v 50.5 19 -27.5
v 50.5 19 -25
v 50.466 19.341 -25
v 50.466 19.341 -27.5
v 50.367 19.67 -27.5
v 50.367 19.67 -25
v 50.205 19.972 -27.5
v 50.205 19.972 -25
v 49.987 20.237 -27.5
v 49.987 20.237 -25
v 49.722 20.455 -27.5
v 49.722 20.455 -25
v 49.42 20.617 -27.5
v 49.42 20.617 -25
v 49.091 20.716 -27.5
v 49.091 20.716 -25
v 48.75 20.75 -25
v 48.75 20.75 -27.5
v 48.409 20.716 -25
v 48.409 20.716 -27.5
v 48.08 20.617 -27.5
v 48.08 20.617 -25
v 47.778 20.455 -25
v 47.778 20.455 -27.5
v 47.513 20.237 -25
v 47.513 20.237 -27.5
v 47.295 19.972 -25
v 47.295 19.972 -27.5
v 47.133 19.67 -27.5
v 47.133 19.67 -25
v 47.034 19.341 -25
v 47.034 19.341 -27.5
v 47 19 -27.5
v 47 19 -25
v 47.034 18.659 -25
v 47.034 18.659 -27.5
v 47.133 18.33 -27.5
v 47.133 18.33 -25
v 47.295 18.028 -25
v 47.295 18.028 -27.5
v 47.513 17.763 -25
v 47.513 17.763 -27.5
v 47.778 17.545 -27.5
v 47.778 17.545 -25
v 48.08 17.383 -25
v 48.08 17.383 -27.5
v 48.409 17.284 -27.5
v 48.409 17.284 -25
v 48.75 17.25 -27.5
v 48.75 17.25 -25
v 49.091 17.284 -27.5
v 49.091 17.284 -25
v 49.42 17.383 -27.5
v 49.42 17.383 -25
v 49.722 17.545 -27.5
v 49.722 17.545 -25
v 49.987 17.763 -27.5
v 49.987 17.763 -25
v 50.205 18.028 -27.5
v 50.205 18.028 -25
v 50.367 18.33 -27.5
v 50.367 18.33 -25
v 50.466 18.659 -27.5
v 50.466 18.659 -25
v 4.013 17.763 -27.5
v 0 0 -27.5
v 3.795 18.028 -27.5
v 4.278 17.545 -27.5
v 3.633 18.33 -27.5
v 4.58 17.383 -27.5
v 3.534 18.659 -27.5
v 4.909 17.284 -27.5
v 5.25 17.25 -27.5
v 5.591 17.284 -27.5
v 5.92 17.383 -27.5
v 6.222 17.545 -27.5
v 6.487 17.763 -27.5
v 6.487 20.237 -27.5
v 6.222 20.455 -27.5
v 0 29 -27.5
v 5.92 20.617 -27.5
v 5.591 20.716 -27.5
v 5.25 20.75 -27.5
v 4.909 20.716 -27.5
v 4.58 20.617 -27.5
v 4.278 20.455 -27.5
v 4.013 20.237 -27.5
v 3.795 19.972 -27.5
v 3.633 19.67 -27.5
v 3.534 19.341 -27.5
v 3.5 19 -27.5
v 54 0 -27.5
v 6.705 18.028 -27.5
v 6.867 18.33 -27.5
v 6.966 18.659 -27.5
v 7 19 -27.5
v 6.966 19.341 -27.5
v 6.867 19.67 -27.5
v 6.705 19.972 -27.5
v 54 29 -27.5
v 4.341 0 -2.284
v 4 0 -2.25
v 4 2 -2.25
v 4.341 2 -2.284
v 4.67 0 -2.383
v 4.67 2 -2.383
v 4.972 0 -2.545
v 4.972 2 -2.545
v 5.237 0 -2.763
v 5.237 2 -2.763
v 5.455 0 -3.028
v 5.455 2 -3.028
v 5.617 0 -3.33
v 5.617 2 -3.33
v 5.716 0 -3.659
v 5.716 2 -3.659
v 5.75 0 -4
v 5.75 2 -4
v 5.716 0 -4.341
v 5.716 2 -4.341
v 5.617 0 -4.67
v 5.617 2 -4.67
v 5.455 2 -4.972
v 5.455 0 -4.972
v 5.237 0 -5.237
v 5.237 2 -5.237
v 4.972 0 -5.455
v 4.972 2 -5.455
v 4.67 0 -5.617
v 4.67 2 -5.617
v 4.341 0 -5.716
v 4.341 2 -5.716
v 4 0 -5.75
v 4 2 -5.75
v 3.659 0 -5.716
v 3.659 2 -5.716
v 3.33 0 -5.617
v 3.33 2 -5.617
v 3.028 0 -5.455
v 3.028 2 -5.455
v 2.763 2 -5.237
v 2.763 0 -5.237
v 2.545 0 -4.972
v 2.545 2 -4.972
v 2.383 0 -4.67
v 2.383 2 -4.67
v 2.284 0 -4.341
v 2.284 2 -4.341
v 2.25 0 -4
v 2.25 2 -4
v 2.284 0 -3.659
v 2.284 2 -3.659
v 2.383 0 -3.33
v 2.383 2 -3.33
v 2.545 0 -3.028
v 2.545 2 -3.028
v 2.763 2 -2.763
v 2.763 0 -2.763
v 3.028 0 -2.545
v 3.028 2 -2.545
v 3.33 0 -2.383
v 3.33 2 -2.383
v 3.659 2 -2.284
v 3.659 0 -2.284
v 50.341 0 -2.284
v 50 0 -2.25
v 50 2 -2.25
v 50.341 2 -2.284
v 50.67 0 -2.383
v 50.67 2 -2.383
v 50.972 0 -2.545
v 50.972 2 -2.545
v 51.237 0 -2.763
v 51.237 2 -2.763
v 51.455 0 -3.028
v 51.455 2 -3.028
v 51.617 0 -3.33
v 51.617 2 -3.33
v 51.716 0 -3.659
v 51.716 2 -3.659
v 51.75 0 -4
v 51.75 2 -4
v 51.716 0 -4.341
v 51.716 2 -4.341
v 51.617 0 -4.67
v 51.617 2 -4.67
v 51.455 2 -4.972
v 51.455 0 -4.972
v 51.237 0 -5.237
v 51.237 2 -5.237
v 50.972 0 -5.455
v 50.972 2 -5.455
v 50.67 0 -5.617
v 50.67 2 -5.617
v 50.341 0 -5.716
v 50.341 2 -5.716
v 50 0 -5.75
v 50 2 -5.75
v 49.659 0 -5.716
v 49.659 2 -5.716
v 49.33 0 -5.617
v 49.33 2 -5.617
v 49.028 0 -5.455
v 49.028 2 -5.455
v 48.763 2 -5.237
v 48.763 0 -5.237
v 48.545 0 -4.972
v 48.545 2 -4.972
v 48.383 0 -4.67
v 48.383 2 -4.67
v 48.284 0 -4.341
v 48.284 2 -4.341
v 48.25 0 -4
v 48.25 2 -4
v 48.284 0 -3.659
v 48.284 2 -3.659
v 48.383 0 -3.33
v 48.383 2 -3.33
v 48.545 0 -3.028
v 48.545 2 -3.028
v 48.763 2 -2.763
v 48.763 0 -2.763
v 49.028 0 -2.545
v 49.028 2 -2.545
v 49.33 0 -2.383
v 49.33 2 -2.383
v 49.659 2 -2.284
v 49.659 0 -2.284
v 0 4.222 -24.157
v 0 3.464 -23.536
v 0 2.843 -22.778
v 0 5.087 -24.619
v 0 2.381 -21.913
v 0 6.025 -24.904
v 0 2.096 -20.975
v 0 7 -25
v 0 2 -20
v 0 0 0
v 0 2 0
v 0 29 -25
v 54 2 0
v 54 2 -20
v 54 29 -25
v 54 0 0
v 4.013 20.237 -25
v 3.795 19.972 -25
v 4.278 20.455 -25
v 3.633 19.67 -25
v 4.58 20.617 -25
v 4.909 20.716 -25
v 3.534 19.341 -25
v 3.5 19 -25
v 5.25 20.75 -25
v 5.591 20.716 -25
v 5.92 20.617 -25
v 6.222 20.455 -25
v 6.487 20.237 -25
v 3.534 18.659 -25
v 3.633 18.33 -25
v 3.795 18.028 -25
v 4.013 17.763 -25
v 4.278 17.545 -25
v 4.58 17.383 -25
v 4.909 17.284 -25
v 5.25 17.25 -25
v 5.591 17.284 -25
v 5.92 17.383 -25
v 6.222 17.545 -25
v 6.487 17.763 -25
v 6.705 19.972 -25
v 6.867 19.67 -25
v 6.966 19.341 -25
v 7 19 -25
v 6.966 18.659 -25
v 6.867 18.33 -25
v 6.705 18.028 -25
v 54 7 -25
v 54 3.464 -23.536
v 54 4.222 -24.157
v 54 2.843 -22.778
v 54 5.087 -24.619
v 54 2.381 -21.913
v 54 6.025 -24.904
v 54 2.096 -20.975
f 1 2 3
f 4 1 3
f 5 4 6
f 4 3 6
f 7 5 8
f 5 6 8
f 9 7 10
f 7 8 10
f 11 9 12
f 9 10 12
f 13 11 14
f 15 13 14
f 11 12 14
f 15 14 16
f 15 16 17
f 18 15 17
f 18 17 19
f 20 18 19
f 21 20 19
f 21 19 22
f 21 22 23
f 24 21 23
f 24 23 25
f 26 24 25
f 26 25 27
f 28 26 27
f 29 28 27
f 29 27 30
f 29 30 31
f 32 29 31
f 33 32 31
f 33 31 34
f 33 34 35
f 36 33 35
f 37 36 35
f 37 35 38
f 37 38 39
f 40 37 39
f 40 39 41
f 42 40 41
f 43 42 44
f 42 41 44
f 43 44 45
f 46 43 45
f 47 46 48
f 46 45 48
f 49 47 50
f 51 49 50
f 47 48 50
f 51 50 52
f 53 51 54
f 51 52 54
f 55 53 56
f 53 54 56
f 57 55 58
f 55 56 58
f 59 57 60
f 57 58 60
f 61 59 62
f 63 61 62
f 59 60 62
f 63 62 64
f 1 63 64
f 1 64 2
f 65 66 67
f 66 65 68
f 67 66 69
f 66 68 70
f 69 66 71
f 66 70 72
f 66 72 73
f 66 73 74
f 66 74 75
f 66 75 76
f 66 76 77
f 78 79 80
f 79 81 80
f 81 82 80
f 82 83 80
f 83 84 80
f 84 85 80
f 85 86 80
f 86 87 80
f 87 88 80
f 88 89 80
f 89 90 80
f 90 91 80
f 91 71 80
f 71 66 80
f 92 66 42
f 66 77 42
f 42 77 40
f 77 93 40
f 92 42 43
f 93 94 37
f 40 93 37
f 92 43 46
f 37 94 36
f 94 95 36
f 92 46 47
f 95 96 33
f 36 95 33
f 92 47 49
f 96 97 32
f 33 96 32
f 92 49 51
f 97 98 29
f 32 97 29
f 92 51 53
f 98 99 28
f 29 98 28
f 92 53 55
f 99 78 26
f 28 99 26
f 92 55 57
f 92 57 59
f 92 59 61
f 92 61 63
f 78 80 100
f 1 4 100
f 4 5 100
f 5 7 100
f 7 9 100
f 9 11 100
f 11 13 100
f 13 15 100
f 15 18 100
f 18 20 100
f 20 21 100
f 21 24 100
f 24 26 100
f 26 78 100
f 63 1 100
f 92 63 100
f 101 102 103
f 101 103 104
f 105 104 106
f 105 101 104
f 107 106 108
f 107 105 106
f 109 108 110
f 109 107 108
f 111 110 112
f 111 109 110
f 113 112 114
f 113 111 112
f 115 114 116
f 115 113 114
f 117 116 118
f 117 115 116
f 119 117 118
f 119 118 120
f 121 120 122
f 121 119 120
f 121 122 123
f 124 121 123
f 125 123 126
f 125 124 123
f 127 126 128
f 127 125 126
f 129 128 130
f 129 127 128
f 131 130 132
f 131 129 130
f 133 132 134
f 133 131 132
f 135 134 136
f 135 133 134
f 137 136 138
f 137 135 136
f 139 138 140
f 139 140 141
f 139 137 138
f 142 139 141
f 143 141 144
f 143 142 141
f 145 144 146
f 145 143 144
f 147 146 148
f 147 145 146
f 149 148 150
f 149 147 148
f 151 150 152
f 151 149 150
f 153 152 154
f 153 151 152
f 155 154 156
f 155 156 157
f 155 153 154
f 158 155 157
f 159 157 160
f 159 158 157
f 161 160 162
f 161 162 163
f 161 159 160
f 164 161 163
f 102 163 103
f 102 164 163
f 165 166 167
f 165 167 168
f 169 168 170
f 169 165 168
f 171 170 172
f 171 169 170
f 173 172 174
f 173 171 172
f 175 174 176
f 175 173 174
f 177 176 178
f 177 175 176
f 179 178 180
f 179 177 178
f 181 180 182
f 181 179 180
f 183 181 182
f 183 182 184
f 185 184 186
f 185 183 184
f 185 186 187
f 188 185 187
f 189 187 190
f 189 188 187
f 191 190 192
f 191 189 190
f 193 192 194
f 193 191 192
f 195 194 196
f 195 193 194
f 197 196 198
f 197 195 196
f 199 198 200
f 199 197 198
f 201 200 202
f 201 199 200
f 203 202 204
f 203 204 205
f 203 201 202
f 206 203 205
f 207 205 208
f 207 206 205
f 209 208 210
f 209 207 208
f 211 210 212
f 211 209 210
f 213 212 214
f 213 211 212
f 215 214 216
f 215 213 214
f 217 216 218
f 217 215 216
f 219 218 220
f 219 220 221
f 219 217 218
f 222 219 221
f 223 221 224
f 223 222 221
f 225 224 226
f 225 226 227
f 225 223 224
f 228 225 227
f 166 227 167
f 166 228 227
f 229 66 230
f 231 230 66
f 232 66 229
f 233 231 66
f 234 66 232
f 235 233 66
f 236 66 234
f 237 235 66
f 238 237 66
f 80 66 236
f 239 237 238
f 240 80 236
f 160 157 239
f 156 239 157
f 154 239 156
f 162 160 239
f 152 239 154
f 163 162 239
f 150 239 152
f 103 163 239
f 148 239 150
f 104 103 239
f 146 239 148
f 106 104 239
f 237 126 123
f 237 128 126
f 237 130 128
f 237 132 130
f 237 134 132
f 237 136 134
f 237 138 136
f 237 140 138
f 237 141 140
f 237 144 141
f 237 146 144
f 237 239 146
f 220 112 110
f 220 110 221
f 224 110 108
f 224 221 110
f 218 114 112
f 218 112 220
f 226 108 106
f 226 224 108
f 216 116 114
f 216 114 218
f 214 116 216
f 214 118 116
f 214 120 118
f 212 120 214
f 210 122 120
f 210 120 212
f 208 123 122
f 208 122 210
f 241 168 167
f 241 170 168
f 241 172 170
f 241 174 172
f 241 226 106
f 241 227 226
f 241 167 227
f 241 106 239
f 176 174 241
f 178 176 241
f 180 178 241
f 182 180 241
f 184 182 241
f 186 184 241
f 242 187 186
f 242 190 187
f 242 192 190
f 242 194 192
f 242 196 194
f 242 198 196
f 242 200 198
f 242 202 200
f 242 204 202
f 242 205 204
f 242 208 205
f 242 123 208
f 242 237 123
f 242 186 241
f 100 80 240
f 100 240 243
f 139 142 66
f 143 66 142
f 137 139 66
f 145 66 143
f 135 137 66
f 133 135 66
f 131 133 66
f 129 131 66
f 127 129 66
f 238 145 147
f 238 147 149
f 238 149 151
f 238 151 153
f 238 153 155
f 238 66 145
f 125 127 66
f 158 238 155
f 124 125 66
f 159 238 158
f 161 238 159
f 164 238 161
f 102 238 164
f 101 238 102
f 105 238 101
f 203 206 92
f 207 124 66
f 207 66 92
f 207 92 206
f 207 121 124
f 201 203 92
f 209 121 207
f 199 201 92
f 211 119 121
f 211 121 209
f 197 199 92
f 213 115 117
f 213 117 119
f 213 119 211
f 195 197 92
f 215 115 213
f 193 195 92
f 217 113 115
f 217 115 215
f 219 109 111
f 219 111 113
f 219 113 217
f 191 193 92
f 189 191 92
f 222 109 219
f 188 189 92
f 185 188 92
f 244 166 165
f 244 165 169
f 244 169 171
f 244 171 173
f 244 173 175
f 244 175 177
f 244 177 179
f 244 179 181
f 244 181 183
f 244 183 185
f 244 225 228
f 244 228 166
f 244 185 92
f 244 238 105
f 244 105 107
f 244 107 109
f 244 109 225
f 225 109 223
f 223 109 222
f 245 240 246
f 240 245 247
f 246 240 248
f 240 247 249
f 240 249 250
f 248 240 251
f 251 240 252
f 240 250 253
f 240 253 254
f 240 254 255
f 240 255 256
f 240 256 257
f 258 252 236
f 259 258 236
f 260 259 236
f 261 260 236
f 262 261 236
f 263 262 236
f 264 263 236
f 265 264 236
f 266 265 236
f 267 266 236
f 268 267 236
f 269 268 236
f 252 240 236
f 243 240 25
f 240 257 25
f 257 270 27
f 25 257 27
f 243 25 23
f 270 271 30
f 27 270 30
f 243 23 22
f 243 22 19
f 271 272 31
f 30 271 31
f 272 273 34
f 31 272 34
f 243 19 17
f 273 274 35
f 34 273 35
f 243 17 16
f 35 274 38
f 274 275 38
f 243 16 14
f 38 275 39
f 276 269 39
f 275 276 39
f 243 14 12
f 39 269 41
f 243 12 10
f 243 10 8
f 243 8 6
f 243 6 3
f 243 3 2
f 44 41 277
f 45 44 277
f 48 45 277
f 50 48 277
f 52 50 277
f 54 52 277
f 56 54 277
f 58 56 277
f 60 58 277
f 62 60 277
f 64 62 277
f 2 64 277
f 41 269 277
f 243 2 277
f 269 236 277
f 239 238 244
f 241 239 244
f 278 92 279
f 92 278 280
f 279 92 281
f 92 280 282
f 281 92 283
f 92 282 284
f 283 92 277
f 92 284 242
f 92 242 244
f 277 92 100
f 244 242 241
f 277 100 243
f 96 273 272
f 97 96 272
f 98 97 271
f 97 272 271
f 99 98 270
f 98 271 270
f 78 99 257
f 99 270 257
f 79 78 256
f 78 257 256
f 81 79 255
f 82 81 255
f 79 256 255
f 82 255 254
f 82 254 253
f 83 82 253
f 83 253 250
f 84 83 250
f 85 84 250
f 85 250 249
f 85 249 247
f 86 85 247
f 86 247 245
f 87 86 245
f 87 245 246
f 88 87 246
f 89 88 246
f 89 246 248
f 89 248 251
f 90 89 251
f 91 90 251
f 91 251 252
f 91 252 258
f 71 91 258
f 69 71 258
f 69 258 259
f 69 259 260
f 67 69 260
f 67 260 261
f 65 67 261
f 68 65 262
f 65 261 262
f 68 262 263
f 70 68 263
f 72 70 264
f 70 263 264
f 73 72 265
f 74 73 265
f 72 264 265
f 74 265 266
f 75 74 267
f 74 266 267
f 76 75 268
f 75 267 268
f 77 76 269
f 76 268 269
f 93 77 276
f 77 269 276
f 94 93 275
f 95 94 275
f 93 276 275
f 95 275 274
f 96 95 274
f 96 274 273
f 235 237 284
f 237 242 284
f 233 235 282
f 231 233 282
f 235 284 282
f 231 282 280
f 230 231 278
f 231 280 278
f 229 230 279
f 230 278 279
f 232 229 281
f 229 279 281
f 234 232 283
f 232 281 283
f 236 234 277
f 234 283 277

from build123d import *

# Parameters (mm, degrees)
SKETCH1_W           = 54
SKETCH1_H           = 25
SKETCH1_R           = 1.75
BOSS_EXTRUDE1_DEPTH = 2
SKETCH2_W           = 54
SKETCH2_H           = 2.5
BOSS_EXTRUDE2_DEPTH = 27
SKETCH3_W           = 54
SKETCH3_H           = 2.5
BOSS_EXTRUDE3_DEPTH = 2
SKETCH4_R           = 1.75
CUT_EXTRUDE1_DEPTH  = 27
FILLET1_R           = 5


with BuildPart() as part:
    # Sketch1 → Boss-Extrude1 (new body)
    with BuildSketch(Plane(origin=(0, 0, 0), x_dir=(1, 0, 0), z_dir=(0, 1, 0))):
        with Locations((27, 12.5)):
            Rectangle(SKETCH1_W, SKETCH1_H)
        with Locations(Location((4, 4, 0), (0, 0, 270))):
            Circle(SKETCH1_R, mode=Mode.SUBTRACT)
        with Locations(Location((50, 4, 0), (0, 0, 270))):
            Circle(SKETCH1_R, mode=Mode.SUBTRACT)
    extrude(amount=BOSS_EXTRUDE1_DEPTH)



with BuildPart() as body_2:
    # Sketch2 → Boss-Extrude2 (new body)
    with BuildSketch(Plane(origin=(0, 2, 0), x_dir=(1, 0, 0), z_dir=(0, 1, 0))):
        with Locations((27, 26.25)):
            Rectangle(SKETCH2_W, SKETCH2_H)
    extrude(amount=BOSS_EXTRUDE2_DEPTH)


with BuildPart() as part_1:
    add(part.part)

    add(body_2.part)  # Boss-Extrude3 merges body 2
    # Sketch3 → Boss-Extrude3 (add)
    with BuildSketch(Plane.XZ.offset(-2)):
        with Locations((27, -26.25)):
            Rectangle(SKETCH3_W, SKETCH3_H)
    extrude(amount=BOSS_EXTRUDE3_DEPTH)

    # Sketch4 → Cut-Extrude1 (cut)
    with BuildSketch(Plane.XY.offset(-25)):
        with Locations((5.25, 19)):
            Circle(SKETCH4_R)
        with Locations((48.75, 19)):
            Circle(SKETCH4_R)
    extrude(amount=-CUT_EXTRUDE1_DEPTH, mode=Mode.SUBTRACT)

    # Fillet1
    fillet1_edges = [part_1.edges().sort_by_distance(p)[0] for p in [
        (27, 2, -25),
    ]]
    fillet(fillet1_edges, radius=FILLET1_R)


solid = part_1.part
